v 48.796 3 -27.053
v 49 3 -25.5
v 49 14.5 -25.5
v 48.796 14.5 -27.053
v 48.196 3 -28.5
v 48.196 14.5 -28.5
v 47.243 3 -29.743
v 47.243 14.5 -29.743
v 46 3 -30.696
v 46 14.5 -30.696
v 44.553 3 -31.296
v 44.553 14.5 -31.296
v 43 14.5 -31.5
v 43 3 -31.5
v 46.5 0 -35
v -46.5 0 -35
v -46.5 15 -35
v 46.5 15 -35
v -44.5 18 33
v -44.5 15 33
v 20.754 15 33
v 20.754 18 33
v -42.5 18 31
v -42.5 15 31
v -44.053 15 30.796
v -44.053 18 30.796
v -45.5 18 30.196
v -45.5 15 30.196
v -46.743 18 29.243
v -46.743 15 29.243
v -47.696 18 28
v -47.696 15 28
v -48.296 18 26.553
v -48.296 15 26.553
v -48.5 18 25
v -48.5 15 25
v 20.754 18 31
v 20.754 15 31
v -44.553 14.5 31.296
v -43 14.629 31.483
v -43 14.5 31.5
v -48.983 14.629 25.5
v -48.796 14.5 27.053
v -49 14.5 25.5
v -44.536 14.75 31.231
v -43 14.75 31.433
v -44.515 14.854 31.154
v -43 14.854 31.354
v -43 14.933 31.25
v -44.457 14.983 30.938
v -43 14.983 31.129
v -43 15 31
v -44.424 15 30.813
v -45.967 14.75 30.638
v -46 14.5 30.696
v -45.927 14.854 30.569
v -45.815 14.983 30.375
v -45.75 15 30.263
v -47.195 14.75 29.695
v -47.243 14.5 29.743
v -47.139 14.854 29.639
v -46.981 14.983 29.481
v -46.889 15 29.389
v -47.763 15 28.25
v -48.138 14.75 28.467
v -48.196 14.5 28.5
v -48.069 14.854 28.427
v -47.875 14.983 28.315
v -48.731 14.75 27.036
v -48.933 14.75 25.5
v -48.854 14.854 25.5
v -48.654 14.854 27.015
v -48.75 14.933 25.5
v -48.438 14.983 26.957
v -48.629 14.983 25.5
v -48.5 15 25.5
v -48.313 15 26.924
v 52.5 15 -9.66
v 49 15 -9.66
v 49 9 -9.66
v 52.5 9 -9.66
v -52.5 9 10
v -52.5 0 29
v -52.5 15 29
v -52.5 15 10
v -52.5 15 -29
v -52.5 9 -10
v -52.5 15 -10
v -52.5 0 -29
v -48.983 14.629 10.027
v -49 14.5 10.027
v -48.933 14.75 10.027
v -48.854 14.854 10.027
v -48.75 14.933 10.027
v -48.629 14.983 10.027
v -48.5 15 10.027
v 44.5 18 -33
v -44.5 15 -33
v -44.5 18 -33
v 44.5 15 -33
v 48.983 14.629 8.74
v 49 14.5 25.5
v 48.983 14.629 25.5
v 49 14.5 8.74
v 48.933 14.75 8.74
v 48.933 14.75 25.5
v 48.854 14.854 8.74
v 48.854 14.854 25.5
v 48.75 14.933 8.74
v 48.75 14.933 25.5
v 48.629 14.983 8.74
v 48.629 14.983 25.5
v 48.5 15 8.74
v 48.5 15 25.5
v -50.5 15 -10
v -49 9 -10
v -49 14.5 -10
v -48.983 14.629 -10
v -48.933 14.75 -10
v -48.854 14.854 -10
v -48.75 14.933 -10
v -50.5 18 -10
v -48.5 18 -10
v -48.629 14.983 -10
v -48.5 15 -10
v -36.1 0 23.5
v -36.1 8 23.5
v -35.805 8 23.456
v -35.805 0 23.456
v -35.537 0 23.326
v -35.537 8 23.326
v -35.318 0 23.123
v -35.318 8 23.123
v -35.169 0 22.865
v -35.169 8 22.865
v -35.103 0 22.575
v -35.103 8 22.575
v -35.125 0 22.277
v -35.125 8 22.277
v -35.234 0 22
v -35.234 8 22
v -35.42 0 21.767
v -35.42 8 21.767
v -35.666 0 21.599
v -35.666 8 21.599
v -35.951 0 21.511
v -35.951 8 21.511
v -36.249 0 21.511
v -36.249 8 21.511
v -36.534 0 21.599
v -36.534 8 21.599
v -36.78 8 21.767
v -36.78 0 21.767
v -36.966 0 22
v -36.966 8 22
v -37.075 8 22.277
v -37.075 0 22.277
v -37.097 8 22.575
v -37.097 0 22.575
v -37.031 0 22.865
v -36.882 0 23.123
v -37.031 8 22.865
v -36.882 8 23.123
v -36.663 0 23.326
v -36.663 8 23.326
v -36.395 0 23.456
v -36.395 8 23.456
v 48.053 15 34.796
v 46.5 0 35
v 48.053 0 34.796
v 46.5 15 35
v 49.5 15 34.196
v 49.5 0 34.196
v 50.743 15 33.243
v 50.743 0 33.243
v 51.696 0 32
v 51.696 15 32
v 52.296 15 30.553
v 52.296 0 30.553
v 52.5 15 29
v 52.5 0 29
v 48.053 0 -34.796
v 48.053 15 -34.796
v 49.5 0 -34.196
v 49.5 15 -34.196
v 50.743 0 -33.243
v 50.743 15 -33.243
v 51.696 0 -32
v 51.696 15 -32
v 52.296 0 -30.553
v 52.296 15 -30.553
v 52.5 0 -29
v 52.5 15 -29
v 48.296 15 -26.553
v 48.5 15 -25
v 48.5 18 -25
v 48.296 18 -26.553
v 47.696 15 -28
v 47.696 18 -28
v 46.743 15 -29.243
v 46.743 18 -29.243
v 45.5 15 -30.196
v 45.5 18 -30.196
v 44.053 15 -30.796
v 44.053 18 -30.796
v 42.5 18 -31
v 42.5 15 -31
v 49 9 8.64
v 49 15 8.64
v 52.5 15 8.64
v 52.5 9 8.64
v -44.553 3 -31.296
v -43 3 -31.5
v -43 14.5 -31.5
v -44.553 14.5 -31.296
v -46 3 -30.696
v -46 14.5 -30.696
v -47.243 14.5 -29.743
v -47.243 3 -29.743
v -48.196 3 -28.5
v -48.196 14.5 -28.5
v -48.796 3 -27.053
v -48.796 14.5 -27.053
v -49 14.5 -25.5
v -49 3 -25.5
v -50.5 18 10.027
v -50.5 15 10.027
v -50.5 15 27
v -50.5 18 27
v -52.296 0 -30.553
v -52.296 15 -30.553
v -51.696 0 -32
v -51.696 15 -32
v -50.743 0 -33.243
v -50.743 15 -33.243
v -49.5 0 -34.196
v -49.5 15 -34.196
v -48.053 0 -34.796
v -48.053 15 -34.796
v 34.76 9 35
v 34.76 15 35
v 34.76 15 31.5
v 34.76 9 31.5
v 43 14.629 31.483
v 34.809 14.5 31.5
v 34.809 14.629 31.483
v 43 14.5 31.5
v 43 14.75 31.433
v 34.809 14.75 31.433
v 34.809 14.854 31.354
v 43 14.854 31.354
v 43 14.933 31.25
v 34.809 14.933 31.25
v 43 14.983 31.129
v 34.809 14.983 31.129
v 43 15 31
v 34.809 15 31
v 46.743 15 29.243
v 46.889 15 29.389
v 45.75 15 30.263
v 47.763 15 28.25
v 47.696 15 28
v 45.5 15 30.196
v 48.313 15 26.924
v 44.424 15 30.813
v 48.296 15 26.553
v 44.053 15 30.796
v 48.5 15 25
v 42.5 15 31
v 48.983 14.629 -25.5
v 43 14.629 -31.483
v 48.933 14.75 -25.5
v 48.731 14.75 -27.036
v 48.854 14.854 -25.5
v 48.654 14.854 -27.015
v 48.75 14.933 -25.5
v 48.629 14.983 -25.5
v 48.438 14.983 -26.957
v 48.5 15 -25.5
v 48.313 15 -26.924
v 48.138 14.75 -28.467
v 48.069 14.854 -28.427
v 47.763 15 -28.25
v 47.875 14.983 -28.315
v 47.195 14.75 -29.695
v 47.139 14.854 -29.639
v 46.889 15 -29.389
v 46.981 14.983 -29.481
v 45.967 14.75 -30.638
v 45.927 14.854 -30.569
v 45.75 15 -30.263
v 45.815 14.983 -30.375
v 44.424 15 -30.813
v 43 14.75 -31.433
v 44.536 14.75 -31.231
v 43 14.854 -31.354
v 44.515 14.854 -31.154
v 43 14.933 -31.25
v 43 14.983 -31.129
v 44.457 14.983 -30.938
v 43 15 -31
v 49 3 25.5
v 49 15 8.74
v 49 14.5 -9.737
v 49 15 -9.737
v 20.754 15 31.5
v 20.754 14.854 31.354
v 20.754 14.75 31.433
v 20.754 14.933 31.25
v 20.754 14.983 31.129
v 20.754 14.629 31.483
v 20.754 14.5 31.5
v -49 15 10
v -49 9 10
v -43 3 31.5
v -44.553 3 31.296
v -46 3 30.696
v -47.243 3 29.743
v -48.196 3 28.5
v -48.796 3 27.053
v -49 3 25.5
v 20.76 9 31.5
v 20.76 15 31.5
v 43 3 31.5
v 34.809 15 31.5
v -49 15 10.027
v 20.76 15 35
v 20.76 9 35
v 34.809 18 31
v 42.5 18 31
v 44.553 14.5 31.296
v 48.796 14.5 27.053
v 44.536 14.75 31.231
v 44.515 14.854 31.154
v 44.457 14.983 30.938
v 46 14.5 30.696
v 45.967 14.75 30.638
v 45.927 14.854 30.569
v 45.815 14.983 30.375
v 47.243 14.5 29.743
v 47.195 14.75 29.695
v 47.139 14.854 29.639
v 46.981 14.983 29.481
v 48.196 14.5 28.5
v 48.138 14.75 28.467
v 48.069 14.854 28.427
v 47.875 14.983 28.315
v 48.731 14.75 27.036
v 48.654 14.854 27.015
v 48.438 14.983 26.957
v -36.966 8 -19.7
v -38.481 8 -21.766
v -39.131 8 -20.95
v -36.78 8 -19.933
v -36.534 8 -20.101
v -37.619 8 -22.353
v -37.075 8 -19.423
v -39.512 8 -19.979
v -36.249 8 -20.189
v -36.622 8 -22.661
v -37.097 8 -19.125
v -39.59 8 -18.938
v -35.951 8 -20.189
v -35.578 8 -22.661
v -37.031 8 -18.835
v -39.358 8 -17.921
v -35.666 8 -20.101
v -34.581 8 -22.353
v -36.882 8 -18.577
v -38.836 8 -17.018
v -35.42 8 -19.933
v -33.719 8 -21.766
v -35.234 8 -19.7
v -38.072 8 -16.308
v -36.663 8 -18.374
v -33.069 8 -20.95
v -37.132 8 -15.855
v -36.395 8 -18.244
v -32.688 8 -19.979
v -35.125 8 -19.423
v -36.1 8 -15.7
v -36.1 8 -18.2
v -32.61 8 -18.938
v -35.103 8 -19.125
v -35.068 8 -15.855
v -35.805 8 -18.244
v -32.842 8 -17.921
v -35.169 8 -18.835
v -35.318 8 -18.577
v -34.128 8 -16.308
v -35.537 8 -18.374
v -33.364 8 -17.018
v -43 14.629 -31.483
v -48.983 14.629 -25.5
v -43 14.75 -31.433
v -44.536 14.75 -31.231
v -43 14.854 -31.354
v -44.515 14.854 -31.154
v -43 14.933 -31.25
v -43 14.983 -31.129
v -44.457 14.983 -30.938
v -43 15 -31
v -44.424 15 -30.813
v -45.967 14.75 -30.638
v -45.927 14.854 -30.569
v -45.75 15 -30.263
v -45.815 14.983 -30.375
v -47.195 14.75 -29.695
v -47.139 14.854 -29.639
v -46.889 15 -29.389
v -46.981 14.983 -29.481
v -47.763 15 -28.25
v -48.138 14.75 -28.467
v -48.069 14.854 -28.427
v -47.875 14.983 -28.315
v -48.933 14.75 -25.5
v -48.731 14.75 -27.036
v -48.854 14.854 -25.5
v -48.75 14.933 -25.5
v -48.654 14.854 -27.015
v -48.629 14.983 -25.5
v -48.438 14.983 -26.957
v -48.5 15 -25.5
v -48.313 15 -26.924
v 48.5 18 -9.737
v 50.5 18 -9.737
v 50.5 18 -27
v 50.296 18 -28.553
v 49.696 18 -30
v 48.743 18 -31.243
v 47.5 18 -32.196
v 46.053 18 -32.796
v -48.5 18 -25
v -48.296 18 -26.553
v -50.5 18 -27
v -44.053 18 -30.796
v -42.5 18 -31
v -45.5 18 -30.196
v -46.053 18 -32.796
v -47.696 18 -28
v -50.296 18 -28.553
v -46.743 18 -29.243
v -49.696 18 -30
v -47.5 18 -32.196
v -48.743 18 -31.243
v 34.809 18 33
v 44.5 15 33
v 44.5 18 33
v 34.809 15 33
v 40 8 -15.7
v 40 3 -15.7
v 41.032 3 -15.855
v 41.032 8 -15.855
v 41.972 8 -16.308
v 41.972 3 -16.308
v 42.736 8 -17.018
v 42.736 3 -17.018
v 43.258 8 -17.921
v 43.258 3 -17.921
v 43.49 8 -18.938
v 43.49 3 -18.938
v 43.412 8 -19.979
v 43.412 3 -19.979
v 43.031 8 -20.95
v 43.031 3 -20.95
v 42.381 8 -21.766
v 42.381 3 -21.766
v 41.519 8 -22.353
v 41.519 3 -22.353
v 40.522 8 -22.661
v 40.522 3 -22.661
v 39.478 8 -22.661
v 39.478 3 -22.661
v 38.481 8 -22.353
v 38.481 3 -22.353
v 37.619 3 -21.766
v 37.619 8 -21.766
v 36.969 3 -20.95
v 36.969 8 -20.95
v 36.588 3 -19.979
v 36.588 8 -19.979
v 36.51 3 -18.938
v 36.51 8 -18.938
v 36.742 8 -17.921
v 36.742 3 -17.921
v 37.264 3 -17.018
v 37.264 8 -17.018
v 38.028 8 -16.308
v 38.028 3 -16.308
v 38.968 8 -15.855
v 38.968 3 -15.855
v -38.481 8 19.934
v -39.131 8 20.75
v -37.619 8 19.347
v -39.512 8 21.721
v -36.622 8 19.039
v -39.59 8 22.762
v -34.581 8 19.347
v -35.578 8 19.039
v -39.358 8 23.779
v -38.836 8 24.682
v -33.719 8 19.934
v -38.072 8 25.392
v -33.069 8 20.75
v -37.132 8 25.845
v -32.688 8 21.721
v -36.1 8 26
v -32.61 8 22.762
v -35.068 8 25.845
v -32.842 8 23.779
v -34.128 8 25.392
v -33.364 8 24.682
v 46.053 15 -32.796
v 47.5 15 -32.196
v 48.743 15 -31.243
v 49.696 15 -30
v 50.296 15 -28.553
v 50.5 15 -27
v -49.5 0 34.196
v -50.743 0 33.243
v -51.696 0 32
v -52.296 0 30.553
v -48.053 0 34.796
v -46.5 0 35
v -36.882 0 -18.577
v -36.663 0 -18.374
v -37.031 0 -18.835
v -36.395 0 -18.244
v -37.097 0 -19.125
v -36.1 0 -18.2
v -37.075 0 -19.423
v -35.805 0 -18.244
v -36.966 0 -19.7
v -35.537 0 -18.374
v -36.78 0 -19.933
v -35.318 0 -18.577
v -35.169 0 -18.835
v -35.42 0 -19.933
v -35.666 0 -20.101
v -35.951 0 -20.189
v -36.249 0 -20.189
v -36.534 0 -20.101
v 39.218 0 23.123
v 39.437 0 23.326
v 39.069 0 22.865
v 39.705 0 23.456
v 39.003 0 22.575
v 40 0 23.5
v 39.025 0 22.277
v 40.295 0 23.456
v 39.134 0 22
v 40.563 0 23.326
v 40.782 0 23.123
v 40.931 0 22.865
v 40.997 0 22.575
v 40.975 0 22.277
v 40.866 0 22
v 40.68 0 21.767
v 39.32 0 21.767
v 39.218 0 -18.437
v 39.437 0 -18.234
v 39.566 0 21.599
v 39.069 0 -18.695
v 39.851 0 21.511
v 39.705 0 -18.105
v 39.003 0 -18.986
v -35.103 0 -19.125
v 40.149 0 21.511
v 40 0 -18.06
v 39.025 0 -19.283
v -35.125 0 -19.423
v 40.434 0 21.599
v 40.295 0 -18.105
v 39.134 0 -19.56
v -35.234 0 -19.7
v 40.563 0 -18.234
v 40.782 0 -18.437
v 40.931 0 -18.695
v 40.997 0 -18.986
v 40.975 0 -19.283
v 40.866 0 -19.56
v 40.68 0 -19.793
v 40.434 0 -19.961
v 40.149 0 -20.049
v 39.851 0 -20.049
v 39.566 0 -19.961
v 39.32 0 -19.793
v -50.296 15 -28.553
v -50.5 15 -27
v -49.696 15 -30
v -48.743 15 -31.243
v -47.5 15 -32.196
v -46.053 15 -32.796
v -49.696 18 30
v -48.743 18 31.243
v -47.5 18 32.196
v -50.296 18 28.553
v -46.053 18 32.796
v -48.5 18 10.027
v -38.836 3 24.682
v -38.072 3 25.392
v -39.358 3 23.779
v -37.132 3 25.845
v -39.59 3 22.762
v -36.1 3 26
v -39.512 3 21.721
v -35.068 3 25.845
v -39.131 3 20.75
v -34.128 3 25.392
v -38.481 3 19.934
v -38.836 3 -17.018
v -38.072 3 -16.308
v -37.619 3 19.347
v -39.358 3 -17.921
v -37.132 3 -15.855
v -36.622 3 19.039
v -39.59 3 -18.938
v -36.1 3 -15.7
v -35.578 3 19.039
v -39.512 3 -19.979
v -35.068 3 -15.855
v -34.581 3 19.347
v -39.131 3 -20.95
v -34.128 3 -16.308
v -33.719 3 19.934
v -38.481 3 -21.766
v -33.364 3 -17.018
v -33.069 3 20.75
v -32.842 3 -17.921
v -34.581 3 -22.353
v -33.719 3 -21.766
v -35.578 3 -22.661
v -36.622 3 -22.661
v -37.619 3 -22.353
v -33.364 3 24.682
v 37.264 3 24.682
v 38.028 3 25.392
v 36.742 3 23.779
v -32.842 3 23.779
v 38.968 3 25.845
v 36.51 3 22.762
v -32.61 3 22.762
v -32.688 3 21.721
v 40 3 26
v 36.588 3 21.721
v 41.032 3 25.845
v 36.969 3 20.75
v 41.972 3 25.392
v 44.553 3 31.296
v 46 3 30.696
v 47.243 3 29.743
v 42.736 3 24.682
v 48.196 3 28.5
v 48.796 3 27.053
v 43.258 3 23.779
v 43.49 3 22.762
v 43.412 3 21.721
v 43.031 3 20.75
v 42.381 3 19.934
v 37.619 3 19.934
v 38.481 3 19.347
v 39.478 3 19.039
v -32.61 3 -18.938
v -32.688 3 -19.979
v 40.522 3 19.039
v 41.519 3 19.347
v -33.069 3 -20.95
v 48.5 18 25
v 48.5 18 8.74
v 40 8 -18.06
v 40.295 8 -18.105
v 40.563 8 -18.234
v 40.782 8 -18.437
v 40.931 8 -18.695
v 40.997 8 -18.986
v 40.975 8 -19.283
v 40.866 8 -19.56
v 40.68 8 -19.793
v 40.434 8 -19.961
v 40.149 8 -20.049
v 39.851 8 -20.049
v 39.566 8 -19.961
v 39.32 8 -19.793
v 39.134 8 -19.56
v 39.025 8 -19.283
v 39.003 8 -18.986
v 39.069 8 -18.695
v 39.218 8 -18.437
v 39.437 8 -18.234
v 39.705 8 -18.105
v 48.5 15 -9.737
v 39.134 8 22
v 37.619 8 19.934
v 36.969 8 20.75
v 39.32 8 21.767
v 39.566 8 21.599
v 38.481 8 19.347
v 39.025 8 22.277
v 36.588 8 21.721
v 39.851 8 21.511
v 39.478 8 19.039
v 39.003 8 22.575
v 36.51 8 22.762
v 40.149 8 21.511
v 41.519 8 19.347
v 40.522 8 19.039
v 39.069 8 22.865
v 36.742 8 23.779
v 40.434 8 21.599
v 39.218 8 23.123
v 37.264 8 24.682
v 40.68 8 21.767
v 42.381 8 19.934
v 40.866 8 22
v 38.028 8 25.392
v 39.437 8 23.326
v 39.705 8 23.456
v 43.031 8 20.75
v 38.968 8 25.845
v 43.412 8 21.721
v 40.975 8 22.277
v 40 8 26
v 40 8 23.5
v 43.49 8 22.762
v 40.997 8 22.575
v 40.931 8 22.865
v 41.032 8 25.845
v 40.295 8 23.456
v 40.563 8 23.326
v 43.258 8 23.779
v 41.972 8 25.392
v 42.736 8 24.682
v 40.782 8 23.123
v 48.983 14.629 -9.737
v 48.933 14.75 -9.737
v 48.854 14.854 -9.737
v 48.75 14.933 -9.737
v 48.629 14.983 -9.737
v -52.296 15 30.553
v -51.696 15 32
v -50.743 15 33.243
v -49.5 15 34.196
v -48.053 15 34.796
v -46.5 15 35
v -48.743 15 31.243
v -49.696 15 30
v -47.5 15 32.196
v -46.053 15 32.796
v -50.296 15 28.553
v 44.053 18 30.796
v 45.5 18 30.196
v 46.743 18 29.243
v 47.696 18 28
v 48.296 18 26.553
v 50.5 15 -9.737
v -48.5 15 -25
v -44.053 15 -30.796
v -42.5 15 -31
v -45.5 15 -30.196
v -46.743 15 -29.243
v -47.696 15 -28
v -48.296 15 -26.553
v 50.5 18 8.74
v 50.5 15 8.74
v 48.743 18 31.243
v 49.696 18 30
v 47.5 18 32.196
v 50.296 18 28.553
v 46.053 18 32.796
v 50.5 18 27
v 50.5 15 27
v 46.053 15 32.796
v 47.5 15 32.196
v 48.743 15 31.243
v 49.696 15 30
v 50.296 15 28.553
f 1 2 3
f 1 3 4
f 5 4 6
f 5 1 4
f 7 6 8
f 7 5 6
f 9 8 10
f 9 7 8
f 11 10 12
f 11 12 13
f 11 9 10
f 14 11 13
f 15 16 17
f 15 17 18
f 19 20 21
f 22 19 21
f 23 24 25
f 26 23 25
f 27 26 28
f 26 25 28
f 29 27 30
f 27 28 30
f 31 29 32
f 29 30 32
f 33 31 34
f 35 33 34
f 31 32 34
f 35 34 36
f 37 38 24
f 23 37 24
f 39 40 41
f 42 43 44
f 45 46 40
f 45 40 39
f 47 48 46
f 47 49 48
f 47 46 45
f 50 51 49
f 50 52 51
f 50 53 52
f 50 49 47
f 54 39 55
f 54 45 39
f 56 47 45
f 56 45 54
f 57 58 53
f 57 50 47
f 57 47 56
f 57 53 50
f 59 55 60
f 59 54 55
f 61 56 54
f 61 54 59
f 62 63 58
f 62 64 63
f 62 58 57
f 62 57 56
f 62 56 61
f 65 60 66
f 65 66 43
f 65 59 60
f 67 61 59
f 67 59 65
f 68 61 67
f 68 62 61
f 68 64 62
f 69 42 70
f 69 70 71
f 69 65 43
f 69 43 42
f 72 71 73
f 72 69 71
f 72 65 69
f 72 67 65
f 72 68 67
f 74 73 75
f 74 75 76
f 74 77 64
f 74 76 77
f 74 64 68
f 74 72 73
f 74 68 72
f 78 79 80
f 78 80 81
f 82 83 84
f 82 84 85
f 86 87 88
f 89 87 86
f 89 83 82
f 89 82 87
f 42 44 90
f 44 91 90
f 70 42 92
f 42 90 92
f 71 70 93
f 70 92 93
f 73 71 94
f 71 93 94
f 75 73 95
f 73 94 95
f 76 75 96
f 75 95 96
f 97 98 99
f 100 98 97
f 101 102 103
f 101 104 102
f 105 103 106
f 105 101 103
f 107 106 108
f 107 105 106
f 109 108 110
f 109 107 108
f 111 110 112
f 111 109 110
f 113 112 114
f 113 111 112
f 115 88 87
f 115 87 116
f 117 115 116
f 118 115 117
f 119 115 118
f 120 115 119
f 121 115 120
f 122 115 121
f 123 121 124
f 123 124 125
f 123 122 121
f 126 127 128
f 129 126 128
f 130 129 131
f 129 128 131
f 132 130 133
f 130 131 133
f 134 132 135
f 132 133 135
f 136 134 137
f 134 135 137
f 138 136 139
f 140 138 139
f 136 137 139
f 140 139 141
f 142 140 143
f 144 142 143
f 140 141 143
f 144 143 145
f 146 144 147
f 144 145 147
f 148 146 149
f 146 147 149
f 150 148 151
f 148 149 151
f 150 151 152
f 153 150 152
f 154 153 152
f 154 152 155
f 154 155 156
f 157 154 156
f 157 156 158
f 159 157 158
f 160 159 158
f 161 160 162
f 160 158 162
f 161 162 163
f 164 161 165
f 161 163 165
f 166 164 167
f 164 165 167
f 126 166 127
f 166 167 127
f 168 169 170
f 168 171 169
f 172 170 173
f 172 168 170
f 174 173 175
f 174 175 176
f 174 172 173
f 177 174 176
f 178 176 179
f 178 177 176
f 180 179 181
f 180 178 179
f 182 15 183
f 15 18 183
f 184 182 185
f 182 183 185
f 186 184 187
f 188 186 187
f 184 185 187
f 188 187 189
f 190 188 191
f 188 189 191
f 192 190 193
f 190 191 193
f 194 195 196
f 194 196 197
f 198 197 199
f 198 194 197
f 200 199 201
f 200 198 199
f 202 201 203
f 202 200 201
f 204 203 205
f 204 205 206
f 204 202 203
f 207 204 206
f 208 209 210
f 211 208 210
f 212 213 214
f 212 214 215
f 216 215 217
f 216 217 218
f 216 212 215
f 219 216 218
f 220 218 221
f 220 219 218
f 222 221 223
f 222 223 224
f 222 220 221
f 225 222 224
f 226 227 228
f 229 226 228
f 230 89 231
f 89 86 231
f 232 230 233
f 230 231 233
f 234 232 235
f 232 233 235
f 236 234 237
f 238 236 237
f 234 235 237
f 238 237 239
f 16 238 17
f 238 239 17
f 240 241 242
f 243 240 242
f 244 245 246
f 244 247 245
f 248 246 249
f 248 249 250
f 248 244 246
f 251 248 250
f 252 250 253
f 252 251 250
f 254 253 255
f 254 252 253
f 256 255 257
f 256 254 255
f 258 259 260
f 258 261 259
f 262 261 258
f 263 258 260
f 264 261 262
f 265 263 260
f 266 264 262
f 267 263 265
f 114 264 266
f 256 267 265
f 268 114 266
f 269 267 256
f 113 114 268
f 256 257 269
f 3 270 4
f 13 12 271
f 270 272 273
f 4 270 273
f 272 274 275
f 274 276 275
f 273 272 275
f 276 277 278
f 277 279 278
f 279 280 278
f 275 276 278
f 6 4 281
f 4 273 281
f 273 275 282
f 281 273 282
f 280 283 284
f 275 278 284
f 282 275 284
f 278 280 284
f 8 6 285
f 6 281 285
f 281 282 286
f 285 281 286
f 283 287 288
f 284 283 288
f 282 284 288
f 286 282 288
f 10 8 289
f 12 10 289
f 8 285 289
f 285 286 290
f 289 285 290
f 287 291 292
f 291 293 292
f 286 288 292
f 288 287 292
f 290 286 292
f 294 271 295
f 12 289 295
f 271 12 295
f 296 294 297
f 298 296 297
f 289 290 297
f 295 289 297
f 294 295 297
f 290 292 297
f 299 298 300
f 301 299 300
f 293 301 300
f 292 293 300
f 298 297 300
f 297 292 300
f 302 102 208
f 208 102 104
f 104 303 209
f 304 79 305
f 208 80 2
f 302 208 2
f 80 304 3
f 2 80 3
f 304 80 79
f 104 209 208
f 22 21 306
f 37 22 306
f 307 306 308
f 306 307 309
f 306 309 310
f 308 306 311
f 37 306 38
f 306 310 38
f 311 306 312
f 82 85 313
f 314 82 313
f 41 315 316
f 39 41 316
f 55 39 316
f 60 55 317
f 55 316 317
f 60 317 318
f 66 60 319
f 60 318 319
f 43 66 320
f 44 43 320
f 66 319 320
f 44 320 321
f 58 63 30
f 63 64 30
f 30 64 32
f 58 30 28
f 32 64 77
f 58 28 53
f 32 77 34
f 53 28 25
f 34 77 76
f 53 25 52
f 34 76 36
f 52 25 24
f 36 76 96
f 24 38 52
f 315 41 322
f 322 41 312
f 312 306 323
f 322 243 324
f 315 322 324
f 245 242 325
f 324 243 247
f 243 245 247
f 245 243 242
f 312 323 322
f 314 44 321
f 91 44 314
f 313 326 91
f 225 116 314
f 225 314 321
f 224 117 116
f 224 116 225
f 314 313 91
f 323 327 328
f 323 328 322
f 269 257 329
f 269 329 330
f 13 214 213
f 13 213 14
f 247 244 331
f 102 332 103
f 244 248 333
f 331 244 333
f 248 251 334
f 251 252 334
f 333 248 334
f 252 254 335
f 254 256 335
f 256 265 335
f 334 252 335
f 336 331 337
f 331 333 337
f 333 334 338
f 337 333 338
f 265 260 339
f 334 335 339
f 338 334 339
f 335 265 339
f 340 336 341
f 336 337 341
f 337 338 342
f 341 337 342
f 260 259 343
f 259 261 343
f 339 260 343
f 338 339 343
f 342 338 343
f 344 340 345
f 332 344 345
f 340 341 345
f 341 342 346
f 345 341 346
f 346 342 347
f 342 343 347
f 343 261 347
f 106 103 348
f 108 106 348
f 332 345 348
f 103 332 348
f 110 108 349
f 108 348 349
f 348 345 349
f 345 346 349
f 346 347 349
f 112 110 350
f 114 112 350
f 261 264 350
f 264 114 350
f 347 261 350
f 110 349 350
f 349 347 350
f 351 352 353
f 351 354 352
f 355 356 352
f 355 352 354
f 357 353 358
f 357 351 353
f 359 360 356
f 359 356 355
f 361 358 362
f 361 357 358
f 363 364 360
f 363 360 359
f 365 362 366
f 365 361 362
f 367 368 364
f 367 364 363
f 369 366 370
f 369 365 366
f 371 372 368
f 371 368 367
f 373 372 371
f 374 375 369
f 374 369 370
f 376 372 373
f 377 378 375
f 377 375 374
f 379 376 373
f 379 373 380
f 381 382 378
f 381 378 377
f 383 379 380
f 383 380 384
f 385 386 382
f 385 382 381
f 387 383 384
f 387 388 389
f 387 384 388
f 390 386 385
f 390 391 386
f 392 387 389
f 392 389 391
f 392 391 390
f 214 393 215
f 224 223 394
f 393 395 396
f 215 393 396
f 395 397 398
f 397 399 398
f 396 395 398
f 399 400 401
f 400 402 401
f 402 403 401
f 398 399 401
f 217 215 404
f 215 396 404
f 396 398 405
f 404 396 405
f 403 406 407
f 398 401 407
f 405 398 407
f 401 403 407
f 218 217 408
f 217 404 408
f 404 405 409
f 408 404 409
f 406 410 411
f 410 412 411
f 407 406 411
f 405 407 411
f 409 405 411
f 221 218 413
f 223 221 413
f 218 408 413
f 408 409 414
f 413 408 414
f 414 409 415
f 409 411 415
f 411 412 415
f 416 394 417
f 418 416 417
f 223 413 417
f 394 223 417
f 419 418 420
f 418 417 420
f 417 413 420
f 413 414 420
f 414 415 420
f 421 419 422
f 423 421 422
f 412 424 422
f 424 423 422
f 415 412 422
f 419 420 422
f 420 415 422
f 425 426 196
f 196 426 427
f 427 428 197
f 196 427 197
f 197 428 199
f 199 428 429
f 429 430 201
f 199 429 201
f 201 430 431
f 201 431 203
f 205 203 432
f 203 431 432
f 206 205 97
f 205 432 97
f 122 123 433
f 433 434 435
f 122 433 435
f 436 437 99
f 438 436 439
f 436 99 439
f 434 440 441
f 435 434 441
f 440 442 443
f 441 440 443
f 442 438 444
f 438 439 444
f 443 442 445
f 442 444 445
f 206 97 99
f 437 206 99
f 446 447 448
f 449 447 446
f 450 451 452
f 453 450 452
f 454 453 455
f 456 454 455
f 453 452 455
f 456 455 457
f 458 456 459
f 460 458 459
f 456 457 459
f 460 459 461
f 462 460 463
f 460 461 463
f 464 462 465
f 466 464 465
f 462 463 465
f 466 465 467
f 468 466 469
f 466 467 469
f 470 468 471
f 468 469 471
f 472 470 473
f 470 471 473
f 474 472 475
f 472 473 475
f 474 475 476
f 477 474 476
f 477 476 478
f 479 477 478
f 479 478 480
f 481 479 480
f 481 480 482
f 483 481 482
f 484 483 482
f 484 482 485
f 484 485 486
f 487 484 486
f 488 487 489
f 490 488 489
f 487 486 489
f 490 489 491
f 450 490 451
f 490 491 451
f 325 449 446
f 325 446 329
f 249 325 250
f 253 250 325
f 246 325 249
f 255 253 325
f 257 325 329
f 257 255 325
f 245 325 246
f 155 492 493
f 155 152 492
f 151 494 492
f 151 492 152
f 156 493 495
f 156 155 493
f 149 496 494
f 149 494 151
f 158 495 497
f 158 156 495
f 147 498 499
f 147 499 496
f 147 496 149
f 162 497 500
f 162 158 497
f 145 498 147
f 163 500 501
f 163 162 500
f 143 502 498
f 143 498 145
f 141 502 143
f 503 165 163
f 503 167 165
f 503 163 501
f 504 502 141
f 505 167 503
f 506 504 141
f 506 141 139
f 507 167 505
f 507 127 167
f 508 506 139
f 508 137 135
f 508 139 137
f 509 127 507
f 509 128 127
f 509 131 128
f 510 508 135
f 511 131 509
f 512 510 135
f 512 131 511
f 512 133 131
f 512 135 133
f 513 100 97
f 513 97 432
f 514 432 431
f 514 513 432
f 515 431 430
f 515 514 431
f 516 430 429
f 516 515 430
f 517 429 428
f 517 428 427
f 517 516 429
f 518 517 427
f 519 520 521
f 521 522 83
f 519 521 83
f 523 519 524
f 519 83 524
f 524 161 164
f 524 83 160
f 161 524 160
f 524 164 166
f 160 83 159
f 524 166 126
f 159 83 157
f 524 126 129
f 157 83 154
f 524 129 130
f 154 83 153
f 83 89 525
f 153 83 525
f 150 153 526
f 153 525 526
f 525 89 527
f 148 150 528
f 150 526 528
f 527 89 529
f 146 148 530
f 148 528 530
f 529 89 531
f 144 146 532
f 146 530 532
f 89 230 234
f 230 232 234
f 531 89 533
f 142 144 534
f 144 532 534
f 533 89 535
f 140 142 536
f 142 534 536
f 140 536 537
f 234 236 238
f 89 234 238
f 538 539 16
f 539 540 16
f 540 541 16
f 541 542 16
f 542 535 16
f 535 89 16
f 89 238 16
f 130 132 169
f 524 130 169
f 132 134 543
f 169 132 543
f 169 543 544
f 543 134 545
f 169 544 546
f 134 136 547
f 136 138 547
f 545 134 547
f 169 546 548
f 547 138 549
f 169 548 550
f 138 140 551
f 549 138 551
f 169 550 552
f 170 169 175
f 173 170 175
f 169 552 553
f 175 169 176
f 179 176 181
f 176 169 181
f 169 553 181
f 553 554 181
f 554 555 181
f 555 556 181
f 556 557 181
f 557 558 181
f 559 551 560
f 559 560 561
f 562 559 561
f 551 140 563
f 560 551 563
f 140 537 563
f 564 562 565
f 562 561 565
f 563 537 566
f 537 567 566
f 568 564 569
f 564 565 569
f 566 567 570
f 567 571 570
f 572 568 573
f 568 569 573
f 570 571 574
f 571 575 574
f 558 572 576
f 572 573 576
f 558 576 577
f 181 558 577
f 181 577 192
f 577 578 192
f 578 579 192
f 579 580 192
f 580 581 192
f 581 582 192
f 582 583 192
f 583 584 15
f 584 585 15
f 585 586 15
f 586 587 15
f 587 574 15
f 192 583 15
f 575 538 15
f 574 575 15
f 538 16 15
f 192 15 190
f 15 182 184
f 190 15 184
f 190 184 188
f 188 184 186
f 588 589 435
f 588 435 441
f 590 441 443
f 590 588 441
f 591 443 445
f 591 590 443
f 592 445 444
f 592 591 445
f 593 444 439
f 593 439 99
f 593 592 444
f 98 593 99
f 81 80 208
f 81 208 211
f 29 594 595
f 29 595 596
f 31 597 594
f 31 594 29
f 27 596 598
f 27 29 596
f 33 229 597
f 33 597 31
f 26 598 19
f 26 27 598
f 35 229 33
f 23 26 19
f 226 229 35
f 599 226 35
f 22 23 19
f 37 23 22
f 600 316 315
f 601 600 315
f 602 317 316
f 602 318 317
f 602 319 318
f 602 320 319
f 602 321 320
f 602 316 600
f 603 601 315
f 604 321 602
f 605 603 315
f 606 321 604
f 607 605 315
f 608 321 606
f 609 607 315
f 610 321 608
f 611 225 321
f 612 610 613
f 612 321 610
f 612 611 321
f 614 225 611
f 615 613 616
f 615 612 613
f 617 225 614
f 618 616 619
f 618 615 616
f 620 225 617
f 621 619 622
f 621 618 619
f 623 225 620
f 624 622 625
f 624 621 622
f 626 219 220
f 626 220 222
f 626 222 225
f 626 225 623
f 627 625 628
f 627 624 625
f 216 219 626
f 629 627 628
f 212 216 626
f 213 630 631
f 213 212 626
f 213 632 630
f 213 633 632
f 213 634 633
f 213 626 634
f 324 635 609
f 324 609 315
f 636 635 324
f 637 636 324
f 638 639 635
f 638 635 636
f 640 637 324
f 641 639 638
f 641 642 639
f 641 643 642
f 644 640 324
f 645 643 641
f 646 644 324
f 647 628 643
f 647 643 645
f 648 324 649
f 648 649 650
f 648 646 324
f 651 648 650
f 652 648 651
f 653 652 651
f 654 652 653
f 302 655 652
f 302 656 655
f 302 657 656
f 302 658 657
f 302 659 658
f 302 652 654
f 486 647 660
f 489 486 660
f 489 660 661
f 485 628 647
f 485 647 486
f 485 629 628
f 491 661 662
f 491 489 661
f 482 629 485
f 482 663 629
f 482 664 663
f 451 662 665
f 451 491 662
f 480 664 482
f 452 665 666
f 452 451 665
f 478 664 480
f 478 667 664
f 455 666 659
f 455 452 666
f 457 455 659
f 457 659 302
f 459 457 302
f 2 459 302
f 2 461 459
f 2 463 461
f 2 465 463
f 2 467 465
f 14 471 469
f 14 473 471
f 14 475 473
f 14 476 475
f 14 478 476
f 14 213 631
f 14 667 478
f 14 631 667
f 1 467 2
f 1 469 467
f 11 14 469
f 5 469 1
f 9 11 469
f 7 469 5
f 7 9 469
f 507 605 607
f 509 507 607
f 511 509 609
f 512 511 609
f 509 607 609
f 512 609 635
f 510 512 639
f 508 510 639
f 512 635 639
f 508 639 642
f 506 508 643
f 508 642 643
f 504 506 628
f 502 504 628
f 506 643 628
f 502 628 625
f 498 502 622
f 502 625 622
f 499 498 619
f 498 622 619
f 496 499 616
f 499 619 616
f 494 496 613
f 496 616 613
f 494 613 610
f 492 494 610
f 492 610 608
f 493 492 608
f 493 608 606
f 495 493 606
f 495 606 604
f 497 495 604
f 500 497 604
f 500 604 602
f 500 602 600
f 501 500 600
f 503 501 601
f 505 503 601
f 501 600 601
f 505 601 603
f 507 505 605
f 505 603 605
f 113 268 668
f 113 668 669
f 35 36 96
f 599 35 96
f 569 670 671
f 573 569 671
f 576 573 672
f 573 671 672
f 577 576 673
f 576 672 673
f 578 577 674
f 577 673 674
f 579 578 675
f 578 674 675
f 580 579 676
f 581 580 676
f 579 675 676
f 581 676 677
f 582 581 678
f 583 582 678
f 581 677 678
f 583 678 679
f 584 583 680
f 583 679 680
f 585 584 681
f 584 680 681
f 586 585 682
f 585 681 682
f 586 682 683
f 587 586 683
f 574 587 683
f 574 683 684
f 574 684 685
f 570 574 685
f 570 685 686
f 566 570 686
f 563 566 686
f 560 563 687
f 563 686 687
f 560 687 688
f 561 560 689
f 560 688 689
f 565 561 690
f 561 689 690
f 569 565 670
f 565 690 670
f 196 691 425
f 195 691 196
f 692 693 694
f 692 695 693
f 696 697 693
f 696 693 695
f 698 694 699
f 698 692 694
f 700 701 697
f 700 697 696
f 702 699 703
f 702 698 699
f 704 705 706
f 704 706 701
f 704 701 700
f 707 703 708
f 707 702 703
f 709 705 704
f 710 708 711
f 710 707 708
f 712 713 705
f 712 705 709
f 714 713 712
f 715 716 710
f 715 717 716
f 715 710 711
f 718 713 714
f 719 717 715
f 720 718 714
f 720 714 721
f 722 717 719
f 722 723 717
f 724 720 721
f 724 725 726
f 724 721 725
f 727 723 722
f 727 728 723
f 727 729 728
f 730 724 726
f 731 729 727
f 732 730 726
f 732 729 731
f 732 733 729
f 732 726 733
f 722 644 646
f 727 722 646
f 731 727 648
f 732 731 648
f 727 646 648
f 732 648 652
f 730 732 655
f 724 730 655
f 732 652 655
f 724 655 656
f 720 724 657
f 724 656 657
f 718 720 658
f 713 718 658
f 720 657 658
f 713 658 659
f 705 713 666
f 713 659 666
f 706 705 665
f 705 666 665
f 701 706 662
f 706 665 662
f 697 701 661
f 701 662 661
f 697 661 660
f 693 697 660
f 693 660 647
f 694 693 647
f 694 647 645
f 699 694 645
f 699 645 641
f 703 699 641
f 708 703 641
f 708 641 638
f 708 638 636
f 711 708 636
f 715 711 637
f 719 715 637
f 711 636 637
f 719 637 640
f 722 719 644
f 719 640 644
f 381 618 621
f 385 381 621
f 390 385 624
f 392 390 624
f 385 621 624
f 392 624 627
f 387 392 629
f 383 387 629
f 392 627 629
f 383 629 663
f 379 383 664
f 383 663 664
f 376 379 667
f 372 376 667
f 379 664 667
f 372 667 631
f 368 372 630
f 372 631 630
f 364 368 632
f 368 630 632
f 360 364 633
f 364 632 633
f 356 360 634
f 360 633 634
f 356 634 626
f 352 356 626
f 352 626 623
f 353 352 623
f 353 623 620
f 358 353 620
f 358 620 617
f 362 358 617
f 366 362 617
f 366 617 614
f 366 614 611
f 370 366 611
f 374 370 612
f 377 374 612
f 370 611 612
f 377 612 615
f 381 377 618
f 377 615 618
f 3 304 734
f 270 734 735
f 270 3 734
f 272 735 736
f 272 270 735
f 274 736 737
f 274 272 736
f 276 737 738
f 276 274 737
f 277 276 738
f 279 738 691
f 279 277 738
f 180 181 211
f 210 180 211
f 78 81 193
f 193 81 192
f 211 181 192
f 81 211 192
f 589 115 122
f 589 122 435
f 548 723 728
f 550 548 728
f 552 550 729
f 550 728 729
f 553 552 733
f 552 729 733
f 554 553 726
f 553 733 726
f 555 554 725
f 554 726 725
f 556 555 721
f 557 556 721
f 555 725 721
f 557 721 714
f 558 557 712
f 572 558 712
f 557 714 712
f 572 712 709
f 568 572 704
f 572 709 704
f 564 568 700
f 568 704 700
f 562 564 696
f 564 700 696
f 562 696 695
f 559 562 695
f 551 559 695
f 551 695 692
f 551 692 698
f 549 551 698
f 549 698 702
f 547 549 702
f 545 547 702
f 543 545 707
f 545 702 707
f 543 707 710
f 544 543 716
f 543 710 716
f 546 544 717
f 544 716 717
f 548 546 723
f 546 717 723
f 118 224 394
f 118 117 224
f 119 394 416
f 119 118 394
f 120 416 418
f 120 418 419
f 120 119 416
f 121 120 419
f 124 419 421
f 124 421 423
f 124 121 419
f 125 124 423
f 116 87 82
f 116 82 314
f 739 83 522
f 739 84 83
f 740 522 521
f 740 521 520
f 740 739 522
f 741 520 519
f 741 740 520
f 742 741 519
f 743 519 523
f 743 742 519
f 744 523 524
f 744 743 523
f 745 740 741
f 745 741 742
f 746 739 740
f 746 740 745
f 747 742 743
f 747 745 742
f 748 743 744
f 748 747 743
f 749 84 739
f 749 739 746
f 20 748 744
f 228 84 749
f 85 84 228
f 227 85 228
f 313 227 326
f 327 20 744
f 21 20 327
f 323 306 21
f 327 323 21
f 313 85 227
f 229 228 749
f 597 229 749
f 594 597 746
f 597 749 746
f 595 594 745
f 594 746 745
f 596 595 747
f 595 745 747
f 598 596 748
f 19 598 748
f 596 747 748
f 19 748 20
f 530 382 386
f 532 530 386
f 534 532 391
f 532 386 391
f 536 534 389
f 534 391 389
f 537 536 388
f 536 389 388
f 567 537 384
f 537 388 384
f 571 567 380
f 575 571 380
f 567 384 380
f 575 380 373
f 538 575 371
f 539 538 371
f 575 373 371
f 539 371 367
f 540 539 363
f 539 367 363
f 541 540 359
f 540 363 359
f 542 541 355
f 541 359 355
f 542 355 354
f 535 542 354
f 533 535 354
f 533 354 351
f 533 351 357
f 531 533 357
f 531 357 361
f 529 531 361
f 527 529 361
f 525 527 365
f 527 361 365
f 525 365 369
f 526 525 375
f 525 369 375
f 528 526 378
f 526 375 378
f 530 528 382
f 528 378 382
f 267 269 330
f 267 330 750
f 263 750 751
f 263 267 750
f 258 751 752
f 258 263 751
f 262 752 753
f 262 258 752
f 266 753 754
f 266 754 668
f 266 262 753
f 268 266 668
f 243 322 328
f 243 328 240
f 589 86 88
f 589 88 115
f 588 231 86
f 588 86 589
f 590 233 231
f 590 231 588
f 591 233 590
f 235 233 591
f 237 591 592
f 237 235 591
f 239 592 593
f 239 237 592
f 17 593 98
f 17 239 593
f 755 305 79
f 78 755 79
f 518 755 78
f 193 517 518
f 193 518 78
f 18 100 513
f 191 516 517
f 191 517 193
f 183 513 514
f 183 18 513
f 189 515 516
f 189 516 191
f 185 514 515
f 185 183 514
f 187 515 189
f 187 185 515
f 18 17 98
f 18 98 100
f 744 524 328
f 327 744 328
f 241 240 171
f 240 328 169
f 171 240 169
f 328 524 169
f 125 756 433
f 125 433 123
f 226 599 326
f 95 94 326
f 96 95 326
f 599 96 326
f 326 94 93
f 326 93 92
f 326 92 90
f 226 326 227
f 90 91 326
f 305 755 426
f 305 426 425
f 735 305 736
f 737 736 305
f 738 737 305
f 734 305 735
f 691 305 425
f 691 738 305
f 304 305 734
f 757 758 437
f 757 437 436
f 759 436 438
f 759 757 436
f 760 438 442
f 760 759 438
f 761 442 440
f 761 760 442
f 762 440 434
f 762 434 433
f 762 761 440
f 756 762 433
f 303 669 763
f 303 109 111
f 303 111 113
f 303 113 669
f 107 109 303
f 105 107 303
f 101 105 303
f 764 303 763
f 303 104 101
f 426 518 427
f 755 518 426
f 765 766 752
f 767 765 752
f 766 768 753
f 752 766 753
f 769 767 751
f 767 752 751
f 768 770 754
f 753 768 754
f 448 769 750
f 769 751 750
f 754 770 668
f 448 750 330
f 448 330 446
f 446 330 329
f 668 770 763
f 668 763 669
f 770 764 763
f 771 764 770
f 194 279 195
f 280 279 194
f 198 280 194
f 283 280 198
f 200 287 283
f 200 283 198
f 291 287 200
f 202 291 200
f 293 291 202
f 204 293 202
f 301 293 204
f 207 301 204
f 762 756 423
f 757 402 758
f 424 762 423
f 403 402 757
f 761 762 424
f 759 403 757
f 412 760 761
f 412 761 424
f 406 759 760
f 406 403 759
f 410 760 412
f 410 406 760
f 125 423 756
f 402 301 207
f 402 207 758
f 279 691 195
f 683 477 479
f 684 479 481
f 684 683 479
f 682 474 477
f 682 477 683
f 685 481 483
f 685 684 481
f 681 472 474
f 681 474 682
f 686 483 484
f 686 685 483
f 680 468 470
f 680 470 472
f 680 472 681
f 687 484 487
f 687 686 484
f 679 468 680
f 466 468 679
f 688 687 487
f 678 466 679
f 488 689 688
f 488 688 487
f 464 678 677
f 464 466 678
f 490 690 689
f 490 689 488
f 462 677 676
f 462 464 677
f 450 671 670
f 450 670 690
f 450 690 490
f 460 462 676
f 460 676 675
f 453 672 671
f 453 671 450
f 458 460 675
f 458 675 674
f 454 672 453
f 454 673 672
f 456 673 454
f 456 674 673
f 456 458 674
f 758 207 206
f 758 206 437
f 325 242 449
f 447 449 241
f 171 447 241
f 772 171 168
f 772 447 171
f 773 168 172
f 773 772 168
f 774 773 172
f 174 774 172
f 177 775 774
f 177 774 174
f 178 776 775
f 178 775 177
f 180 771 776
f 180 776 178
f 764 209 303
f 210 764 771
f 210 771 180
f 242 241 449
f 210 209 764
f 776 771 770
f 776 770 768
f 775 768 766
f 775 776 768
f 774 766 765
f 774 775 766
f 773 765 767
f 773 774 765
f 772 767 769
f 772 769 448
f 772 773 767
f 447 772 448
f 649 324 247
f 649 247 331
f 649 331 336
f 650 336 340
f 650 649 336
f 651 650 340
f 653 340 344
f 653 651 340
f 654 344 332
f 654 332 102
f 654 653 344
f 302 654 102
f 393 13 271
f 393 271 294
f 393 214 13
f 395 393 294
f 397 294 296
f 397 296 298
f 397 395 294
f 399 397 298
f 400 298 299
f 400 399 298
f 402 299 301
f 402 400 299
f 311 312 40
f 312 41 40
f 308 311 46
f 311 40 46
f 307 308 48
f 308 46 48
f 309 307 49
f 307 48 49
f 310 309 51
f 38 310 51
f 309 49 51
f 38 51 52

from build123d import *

# Parameters (mm, degrees)
SKETCH1_W           = 105
SKETCH1_H           = 70
BOSS_EXTRUDE1_DEPTH = 15
SKETCH3_W           = 98
SKETCH3_H           = 63
CUT_EXTRUDE1_DEPTH  = 12
FILLET1_R           = 6
SKETCH4_R           = 3.5
BOSS_EXTRUDE2_DEPTH = 5
SKETCH5_R           = 1
CUT_EXTRUDE2_DEPTH  = 8
SKETCH6_W           = 3.5
SKETCH6_H           = 18.3
SKETCH6_W_2         = 14
SKETCH6_H_2         = 3.5
SKETCH6_H_3         = 20
CUT_EXTRUDE3_DEPTH  = 6
BOSS_EXTRUDE3_DEPTH = 3
FILLET2_R           = 0.5


with BuildPart() as part:
    # Sketch1 → Boss-Extrude1 (new body)
    with BuildSketch(Plane(origin=(0, 0, 0), x_dir=(1, 0, 0), z_dir=(0, 1, 0))):
        Rectangle(SKETCH1_W, SKETCH1_H)
    extrude(amount=BOSS_EXTRUDE1_DEPTH)

    # Sketch3 → Cut-Extrude1 (cut)
    with BuildSketch(Plane(origin=(0, 15, 0), x_dir=(1, 0, 0), z_dir=(0, 1, 0))):
        Rectangle(SKETCH3_W, SKETCH3_H)
    extrude(amount=-CUT_EXTRUDE1_DEPTH, mode=Mode.SUBTRACT)

    # Fillet1
    fillet1_edges = [part.edges().sort_by_distance(p)[0] for p in [
        (-49, 9, 31.5),
        (-49, 9, -31.5),
        (49, 9, -31.5),
        (49, 9, 31.5),
        (52.5, 7.5, 35),
        (-52.5, 7.5, 35),
        (-52.5, 7.5, -35),
        (52.5, 7.5, -35),
    ]]
    fillet(fillet1_edges, radius=FILLET1_R)

    # Sketch4 → Boss-Extrude2 (add)
    with BuildSketch(Plane(origin=(0, 3, 0), x_dir=(1, 0, 0), z_dir=(0, 1, 0))):
        with Locations(Location((40, -22.5, 0), (0, 0, 270))):
            Circle(SKETCH4_R)
        with Locations(Location((40, 19.2, 0), (0, 0, 270))):
            Circle(SKETCH4_R)
        with Locations(Location((-36.1, -22.5, 0), (0, 0, 270))):
            Circle(SKETCH4_R)
        with Locations(Location((-36.1, 19.2, 0), (0, 0, 270))):
            Circle(SKETCH4_R)
    extrude(amount=BOSS_EXTRUDE2_DEPTH)

    # Sketch5 → Cut-Extrude2 (cut)
    with BuildSketch(Plane(origin=(0, 8, 0), x_dir=(1, 0, 0), z_dir=(0, 1, 0))):
        with Locations(Location((-36.1, 19.2, 0), (0, 0, 270))):
            Circle(SKETCH5_R)
        with Locations(Location((-36.1, -22.5, 0), (0, 0, 270))):
            Circle(SKETCH5_R)
        with Locations(Location((40, -22.5, 0), (0, 0, 270))):
            Circle(SKETCH5_R)
        with Locations(Location((40, 19.06026255, 0), (0, 0, 270))):
            Circle(SKETCH5_R)
    extrude(amount=-CUT_EXTRUDE2_DEPTH, mode=Mode.SUBTRACT)

    # Sketch6 → Cut-Extrude3 (cut)
    with BuildSketch(Plane(origin=(0, 15, 0), x_dir=(1, 0, 0), z_dir=(0, 1, 0))):
        with Locations((50.75, 0.51)):
            Rectangle(SKETCH6_W, SKETCH6_H)
        with Locations((27.76, -33.25)):
            Rectangle(SKETCH6_W_2, SKETCH6_H_2)
        with Locations((-50.75, 0)):
            Rectangle(SKETCH6_W, SKETCH6_H_3)
    extrude(amount=-CUT_EXTRUDE3_DEPTH, mode=Mode.SUBTRACT)

    # Sketch7 → Boss-Extrude3 (add)
    with BuildSketch(Plane(origin=(0, 15, 0), x_dir=(1, 0, 0), z_dir=(0, 1, 0))):
        with BuildLine():
            Line((-44.5, 33), (44.5, 33))
            ThreePointArc((44.5, 33), (48.742640687, 31.242640687), (50.5, 27))
            Line((50.5, 27), (50.5, 9.736559035))
            Line((50.5, 9.736559035), (48.5, 9.736559035))
            Line((48.5, 9.736559035), (48.5, 25))
            ThreePointArc((48.5, 25), (46.742640687, 29.242640687), (42.5, 31))
            Line((42.5, 31), (-42.5, 31))
            ThreePointArc((-42.5, 31), (-46.742640687, 29.242640687), (-48.5, 25))
            Line((-48.5, 25), (-48.5, 10))
            Line((-48.5, 10), (-50.5, 10))
            Line((-50.5, 10), (-50.5, 27))
            ThreePointArc((-50.5, 27), (-48.742640687, 31.242640687), (-44.5, 33))
        make_face()
        with BuildLine():
            Line((-44.5, -33), (20.754470261, -33))
            Line((20.754470261, -33), (20.754470261, -31))
            Line((20.754470261, -31), (-42.5, -31))
            ThreePointArc((-42.5, -31), (-46.742640687, -29.242640687), (-48.5, -25))
            Line((-48.5, -25), (-48.5, -10.02702289))
            Line((-48.5, -10.02702289), (-50.5, -10.02702289))
            Line((-50.5, -10.02702289), (-50.5, -27))
            ThreePointArc((-50.5, -27), (-48.742640687, -31.242640687), (-44.5, -33))
        make_face()
        with BuildLine():
            Line((50.5, -8.739580153), (50.5, -27))
            ThreePointArc((50.5, -27), (48.742640687, -31.242640687), (44.5, -33))
            Line((44.5, -33), (34.809182833, -33))
            Line((34.809182833, -33), (34.809182833, -31))
            Line((34.809182833, -31), (42.5, -31))
            ThreePointArc((42.5, -31), (46.742640687, -29.242640687), (48.5, -25))
            Line((48.5, -25), (48.5, -8.739580153))
            Line((48.5, -8.739580153), (50.5, -8.739580153))
        make_face()
    extrude(amount=BOSS_EXTRUDE3_DEPTH)

    # Fillet2
    fillet2_edges = [part.edges().sort_by_distance(p)[0] for p in [
        (49, 15, 17.119790077),
        (47.242640687, 15, 29.742640687),
        (-49, 15, 17.763511445),
        (-47.242640687, 15, 29.742640687),
        (49, 15, -17.618279517),
        (47.242640687, 15, -29.742640687),
        (-49, 15, -17.75),
        (-47.242640687, 15, -29.742640687),
        (38.904591417, 15, 31.5),
        (-11.12276487, 15, 31.5),
        (0, 15, -31.5),
    ]]
    fillet(fillet2_edges, radius=FILLET2_R - 0.0001)  # a hair under: the kernel refuses the full size


solid = part.part
